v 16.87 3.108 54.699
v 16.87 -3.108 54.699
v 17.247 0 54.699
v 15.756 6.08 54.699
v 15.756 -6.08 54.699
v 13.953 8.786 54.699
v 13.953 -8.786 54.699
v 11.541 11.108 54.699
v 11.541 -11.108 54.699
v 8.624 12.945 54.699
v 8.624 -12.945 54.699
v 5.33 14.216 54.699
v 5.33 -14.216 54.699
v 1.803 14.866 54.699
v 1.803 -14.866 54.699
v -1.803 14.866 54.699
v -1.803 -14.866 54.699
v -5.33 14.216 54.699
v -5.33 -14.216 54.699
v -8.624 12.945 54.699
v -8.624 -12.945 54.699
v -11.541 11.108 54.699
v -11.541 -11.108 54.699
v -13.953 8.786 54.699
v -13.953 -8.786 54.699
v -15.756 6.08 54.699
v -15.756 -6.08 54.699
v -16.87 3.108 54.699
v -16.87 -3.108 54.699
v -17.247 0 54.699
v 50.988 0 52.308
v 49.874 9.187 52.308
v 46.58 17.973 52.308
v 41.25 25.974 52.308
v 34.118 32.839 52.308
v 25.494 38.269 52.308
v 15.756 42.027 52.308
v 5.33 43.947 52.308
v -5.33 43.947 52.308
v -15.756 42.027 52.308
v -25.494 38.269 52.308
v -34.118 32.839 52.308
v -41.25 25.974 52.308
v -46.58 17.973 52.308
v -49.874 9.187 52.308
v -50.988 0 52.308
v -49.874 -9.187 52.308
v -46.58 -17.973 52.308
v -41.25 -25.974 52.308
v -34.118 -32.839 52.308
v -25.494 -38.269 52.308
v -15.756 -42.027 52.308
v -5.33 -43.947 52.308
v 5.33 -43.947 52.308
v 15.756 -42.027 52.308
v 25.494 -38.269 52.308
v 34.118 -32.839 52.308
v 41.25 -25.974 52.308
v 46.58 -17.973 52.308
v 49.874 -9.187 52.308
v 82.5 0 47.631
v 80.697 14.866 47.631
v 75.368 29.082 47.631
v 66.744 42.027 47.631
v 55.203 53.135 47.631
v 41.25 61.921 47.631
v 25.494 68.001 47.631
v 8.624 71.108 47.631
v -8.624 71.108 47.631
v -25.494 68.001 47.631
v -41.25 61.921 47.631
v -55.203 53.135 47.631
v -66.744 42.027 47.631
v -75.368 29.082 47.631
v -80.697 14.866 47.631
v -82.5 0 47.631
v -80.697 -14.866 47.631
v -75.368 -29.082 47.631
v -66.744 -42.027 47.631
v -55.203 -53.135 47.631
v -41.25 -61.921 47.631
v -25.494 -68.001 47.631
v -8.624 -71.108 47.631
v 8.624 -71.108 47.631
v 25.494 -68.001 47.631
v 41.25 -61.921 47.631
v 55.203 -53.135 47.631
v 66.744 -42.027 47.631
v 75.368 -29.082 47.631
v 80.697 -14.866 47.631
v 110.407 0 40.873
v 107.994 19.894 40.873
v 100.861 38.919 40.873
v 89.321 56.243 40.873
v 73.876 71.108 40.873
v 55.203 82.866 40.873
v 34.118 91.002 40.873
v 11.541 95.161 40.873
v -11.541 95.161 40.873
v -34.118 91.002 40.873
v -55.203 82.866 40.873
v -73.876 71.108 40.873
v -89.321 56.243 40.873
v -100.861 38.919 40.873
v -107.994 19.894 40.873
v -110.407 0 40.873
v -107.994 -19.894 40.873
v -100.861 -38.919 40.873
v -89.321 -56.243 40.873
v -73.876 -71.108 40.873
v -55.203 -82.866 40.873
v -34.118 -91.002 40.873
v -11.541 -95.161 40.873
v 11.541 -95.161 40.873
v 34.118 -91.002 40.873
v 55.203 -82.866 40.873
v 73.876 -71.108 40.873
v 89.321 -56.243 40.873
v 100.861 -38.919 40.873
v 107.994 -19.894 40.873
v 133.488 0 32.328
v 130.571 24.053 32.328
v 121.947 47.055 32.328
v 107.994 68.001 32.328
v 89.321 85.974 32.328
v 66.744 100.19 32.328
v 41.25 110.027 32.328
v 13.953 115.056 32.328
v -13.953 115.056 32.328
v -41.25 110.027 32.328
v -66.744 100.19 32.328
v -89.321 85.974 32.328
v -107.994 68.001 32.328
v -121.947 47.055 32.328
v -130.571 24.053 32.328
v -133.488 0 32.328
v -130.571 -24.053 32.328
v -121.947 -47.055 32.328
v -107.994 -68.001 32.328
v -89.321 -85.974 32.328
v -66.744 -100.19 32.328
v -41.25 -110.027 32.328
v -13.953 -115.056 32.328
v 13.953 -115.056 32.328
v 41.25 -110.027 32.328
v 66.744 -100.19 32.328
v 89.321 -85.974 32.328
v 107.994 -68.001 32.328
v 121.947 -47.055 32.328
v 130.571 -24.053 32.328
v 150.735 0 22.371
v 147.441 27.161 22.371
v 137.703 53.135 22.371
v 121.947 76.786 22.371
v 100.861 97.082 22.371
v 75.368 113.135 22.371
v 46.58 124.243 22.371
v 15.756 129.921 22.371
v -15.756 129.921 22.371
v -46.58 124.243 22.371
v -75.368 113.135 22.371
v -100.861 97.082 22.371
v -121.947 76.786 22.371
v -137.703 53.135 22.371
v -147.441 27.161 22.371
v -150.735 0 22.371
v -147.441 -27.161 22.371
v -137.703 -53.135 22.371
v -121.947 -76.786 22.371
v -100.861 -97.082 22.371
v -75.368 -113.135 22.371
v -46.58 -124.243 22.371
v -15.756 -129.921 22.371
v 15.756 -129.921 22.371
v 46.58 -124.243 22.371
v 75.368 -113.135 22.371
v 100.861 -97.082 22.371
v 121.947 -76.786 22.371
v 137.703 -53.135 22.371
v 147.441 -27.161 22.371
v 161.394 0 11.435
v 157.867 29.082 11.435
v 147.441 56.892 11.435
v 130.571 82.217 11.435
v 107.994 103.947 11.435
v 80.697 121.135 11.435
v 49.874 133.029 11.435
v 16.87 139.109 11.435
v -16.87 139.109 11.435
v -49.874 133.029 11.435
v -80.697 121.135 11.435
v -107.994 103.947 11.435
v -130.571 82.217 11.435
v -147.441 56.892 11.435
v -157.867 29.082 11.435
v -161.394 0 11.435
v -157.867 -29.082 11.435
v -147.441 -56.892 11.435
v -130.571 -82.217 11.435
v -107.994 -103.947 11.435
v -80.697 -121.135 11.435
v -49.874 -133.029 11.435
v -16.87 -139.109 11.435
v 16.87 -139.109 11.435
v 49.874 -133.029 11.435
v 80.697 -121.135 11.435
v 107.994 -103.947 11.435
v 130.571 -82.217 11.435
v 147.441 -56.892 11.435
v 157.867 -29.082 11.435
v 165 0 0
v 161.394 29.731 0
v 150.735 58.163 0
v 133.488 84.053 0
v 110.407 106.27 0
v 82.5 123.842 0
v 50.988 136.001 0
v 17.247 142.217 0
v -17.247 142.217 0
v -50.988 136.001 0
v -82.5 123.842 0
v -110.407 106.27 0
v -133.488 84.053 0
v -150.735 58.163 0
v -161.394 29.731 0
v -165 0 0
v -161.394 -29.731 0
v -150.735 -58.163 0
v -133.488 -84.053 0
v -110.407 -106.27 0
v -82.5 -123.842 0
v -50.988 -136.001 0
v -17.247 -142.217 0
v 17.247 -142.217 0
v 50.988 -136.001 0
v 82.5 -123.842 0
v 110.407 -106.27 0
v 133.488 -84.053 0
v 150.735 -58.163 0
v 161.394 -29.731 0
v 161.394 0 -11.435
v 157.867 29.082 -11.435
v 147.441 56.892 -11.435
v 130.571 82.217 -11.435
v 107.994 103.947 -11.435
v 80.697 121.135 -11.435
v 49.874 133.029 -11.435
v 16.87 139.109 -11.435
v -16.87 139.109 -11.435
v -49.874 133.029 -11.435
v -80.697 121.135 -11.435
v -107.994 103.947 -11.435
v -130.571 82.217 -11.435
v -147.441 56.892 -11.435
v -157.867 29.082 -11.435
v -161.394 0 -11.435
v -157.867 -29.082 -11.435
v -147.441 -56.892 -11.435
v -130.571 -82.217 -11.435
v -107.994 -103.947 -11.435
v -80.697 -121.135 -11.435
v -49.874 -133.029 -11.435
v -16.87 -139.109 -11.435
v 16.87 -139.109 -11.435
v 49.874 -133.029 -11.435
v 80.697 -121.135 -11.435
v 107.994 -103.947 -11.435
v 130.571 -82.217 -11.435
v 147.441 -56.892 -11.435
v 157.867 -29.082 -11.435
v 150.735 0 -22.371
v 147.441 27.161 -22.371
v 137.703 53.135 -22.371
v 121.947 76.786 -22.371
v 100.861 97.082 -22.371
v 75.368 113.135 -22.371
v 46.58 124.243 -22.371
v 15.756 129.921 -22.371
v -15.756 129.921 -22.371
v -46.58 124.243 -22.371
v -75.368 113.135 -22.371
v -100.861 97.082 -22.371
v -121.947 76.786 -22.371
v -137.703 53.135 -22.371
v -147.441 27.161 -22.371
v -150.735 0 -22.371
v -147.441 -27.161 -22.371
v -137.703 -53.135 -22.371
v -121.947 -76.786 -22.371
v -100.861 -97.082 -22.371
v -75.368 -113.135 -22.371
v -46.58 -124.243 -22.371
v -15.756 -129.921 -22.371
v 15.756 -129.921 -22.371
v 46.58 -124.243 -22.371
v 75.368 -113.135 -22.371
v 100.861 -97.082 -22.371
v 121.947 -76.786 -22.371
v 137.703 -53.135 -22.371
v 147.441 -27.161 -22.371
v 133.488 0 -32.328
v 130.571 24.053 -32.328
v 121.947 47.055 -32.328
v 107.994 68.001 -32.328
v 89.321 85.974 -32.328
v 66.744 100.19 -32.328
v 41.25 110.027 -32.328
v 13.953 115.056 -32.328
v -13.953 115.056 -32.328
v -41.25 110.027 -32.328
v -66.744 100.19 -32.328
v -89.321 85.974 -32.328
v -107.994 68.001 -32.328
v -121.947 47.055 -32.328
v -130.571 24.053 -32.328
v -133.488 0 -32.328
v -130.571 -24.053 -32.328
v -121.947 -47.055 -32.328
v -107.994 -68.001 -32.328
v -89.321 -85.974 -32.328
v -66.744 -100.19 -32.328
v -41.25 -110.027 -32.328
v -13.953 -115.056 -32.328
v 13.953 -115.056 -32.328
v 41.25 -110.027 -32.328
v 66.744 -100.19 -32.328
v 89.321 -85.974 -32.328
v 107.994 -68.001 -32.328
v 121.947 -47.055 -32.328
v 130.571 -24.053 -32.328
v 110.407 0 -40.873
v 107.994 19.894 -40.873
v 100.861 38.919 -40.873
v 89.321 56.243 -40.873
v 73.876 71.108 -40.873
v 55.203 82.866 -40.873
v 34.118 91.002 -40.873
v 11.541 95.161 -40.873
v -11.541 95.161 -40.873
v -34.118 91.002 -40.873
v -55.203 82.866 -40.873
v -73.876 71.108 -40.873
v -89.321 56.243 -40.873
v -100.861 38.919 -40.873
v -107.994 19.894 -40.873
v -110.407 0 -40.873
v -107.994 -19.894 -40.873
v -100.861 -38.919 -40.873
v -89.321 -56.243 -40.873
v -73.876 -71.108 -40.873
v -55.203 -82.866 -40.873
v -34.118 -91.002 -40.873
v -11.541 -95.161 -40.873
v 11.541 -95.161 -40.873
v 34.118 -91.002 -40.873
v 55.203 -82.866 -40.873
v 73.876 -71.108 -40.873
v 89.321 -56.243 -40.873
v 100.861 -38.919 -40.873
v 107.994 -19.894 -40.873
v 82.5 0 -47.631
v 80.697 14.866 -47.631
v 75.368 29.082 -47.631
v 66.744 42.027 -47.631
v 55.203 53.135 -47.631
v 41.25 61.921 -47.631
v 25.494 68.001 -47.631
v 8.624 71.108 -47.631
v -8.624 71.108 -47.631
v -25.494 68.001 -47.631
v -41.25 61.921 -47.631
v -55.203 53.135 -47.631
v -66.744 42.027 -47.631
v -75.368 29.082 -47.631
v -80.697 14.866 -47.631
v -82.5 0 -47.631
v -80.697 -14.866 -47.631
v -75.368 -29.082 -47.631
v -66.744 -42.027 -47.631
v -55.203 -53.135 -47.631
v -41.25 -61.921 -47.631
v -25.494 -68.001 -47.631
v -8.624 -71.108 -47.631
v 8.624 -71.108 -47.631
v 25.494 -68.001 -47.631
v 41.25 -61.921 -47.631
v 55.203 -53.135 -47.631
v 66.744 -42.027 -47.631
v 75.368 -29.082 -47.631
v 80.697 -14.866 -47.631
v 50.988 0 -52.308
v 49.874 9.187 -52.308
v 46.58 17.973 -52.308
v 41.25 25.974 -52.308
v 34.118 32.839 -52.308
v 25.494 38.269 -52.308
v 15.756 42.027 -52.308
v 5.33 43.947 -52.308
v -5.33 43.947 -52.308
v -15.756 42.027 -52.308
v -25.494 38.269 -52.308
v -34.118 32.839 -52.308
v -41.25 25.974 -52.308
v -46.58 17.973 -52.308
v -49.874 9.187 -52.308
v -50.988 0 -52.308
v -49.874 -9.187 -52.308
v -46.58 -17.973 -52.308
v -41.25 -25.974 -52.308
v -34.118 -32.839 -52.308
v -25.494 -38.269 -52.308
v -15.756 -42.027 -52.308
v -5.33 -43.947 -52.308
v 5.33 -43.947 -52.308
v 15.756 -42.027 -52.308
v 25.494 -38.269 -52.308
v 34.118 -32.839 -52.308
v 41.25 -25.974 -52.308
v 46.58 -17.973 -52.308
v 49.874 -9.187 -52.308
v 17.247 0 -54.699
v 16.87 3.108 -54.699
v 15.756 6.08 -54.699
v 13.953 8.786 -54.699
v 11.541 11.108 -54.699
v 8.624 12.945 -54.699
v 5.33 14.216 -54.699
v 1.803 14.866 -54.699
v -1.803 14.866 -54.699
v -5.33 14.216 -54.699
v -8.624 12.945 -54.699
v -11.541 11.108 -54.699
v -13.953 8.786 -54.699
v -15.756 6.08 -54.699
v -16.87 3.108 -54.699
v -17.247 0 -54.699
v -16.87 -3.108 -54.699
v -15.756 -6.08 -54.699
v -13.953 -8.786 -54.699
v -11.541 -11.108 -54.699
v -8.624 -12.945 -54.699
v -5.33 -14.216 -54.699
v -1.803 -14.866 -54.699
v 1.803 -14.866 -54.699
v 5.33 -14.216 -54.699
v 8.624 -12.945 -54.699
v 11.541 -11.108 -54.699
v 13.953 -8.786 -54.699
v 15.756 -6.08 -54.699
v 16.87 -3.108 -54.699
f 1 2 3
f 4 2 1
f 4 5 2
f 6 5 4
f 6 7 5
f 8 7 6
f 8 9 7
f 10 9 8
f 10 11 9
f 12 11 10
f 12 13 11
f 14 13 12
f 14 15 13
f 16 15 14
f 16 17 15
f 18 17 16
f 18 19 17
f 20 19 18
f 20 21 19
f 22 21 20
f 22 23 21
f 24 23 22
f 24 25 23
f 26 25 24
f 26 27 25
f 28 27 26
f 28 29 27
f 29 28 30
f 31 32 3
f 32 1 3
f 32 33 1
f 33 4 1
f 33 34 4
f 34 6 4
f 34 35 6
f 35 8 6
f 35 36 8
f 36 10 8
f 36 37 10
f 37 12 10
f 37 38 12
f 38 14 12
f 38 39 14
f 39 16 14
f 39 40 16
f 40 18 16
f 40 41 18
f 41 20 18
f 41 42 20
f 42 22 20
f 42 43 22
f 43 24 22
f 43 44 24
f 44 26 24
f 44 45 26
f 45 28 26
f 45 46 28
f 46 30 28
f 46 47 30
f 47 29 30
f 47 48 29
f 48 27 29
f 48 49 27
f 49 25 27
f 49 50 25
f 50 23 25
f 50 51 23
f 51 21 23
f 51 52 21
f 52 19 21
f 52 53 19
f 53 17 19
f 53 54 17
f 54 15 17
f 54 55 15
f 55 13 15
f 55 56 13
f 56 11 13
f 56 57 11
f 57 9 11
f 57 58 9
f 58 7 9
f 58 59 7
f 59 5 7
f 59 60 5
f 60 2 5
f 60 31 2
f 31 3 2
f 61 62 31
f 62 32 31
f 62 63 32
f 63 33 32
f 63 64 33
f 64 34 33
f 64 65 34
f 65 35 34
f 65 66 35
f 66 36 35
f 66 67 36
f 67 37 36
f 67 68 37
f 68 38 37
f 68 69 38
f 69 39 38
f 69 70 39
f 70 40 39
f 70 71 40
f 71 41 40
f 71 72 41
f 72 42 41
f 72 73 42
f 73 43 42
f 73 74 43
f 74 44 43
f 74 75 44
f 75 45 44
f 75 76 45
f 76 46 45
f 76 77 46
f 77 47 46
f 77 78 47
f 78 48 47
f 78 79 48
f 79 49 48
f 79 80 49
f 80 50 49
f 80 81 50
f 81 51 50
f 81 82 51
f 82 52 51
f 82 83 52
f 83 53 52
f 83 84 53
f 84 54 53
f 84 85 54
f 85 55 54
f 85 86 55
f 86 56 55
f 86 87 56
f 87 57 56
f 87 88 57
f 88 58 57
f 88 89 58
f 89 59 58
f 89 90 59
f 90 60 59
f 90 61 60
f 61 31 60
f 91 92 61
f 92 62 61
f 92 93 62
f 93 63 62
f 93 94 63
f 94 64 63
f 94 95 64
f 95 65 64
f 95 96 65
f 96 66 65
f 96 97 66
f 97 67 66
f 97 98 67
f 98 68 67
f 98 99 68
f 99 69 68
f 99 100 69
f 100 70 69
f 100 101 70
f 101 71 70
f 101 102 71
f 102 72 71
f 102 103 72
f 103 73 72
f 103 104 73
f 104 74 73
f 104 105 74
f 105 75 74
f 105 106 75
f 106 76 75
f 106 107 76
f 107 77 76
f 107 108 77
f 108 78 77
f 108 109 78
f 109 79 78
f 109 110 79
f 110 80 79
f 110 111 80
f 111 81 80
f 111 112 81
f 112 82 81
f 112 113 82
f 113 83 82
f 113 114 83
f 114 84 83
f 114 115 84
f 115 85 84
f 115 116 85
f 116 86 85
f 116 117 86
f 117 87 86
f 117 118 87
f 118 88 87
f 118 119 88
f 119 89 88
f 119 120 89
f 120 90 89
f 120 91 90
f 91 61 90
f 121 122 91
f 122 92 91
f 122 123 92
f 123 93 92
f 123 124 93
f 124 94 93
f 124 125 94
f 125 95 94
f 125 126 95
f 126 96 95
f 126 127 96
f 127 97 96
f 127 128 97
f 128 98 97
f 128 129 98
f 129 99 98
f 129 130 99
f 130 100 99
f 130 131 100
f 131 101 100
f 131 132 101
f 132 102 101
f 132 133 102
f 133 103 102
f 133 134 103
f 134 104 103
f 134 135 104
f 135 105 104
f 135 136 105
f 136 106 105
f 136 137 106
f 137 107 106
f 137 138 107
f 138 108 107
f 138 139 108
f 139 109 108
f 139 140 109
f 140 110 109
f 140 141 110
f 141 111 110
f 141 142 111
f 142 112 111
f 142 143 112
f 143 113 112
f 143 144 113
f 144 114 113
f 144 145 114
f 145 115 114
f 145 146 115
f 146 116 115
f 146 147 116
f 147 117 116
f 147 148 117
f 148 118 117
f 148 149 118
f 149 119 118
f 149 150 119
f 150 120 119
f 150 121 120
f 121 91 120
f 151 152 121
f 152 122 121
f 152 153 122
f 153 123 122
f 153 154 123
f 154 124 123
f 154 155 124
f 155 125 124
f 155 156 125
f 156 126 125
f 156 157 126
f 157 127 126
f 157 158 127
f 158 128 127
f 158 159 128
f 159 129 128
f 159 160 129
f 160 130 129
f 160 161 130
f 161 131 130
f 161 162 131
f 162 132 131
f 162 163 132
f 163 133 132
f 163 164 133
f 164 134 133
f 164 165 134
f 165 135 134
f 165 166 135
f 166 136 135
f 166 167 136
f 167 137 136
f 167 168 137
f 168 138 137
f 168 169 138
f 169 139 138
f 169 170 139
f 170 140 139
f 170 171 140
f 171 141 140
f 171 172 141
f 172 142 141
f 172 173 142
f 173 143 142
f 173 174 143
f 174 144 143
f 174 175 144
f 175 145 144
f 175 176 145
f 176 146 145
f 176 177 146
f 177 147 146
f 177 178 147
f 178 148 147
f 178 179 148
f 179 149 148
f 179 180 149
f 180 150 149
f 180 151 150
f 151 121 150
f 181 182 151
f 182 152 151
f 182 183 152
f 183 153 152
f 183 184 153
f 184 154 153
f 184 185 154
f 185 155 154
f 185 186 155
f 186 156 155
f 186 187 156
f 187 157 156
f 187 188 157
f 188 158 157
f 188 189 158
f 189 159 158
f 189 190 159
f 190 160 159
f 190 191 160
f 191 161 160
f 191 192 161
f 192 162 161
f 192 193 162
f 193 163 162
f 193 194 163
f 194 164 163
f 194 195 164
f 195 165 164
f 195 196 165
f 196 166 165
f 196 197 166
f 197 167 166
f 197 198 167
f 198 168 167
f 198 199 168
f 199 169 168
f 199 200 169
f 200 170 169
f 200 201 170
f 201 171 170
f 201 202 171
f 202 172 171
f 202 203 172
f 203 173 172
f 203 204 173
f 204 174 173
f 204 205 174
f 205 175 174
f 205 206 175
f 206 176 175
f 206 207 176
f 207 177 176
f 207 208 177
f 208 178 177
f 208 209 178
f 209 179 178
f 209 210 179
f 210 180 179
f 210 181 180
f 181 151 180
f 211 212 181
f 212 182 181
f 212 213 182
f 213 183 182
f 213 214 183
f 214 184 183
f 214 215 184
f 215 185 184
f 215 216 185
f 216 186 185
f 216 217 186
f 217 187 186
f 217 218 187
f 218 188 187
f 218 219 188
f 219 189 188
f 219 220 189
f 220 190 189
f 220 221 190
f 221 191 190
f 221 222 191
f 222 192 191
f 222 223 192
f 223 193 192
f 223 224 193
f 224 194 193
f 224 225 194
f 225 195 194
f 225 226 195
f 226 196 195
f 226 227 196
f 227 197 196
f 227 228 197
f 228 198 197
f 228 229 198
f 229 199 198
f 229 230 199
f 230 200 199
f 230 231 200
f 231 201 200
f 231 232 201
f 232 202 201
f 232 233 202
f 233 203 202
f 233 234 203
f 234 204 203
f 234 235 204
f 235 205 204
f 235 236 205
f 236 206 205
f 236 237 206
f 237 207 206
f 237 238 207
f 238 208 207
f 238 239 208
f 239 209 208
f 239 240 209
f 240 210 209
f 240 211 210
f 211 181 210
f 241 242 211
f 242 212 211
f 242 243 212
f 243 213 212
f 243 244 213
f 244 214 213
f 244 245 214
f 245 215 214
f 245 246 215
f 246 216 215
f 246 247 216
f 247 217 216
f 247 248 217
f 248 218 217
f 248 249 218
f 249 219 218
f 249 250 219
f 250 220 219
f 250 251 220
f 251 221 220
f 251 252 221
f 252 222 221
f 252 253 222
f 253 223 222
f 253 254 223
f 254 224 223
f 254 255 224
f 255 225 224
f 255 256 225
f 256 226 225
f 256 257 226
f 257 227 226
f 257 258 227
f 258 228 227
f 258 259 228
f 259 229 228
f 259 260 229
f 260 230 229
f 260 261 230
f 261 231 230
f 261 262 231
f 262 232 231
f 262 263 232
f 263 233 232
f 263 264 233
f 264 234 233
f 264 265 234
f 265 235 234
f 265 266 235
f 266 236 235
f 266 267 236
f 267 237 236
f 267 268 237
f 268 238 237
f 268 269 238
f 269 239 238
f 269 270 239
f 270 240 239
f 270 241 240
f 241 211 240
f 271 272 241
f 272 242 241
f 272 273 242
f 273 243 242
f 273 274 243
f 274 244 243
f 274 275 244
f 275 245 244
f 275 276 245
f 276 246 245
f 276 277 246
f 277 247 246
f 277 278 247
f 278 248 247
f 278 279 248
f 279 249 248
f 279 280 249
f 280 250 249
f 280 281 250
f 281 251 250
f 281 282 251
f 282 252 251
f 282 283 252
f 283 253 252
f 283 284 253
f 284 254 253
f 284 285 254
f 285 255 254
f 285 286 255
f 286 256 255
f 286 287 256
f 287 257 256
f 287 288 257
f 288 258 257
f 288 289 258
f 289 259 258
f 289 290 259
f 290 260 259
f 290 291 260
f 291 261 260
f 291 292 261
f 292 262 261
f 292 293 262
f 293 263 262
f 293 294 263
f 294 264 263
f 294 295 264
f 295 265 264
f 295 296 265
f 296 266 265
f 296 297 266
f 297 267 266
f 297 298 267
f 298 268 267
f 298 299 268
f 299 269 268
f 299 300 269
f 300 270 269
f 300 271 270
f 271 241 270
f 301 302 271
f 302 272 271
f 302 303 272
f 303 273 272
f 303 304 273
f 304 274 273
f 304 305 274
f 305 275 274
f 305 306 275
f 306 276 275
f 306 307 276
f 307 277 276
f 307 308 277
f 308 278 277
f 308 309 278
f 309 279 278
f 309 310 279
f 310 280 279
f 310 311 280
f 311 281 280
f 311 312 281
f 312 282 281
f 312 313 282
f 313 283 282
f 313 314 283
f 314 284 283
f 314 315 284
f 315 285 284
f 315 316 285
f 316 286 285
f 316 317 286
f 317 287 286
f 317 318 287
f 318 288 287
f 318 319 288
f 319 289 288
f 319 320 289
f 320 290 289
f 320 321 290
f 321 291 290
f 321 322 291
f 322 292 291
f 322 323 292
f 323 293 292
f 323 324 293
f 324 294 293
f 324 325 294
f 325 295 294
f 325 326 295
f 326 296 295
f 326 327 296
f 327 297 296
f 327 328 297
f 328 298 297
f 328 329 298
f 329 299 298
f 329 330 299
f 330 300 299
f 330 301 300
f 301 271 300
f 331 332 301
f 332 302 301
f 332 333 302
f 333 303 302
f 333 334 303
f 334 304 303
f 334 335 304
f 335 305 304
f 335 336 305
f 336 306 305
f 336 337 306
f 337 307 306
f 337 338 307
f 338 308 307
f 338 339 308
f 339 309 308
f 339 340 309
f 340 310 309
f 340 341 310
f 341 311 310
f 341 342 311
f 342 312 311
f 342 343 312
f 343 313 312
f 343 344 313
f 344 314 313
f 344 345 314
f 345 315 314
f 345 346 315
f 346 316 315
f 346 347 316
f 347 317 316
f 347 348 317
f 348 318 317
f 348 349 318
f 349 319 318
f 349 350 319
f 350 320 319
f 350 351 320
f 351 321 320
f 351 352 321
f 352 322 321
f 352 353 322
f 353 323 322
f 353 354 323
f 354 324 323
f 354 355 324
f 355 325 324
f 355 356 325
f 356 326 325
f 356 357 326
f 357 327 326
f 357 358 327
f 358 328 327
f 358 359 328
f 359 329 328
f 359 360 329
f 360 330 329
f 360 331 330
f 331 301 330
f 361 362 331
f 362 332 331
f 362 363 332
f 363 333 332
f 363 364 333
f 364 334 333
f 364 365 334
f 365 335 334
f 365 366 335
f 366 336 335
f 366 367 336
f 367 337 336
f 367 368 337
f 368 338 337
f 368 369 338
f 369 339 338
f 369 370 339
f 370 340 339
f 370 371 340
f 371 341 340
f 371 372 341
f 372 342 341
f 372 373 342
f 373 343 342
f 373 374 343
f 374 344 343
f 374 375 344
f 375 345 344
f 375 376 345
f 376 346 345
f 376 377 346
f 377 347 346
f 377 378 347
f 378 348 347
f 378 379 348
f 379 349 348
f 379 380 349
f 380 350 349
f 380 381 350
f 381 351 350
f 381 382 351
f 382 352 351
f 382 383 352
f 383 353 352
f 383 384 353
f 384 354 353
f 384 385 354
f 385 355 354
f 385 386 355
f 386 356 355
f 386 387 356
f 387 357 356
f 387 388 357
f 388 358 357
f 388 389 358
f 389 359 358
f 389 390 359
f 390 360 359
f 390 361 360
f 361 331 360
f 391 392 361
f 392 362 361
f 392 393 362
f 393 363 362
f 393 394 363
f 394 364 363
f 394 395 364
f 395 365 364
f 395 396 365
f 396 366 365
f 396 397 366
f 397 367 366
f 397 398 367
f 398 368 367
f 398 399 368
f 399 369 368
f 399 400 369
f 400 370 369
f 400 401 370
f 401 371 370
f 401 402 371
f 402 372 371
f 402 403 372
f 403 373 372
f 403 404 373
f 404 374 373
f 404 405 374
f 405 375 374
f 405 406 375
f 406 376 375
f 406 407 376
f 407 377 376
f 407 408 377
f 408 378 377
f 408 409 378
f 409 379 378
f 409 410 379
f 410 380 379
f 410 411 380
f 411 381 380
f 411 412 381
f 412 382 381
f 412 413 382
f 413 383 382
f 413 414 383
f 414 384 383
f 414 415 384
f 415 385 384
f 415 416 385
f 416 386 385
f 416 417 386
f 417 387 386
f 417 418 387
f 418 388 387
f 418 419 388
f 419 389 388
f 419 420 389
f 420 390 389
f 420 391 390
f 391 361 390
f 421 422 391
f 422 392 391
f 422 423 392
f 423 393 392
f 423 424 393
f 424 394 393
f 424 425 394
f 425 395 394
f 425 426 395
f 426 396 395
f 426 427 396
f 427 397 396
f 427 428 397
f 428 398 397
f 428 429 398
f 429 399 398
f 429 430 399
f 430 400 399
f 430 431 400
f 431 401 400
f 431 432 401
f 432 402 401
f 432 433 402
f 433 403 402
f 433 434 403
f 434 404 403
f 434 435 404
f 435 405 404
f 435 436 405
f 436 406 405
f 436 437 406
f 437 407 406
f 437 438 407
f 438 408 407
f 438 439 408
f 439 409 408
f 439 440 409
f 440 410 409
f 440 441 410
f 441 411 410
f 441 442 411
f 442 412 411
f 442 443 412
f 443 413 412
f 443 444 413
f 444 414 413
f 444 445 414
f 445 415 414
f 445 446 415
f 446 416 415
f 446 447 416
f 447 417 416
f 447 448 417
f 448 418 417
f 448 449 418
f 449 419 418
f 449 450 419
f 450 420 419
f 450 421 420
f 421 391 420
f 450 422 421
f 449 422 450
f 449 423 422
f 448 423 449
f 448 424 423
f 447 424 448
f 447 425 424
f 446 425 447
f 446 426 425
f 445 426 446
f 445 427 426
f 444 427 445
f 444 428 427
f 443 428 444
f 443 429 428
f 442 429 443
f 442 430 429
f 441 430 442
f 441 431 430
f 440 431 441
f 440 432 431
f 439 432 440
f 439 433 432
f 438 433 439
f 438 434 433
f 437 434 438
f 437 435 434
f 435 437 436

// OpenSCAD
// Generated by SolidPython 1.0.1 on 2020-07-29 00:46:52


scale(v = [15, 13, 5]) {
	sphere(r = 11);
}
/***********************************************
*********      SolidPython code:      **********
************************************************
 
# import packages: SolidPython
from solid import *
from solid.utils import *
from itertools import chain, combinations, permutations


class Resize:

    def __init__(self, scad_file):
        self.scad_file = scad_file
        #self.scad_file = import_scad(scad_file)
        # cone/cylinder param:
        self.r1 = 0
        self.r2 = 0
        self.h = 0
        # rectangular prism param:
        self.w = 0
        self.l = 0
        # ellipse param:
        self.r = 0

    # import OpenScad code (file name corresponds to shape)


    # classify shape + parameters
    def assign(self, param1, param2, param3):
        if self.scad_file == 'cone.scad':
            self.r1 = param1
            self.r2 = param2
            self.h = param3
        elif self.scad_file == 'cylinder.scad':
            self.r1 = param1
            self.r2 = param2
            self.h = param3
        elif self.scad_file == 'rectangularPrism.scad':
            self.h = param1
            self.l = param2
            self.w = param3
        else:
            self.r = param1
            self.h = param2

    # resize parameters
    def iterate(self):
        x = range(3, 20, 2)
        i = 1
        if self.scad_file == 'cone.scad':
            tempList = list(permutations(x, 2))
            for temp in tempList:
                param1 = temp[0]
                param2 = temp[1]
                filepath = 'produced_scad_files/' + 'cone' + str(param1) + '_' + str(param2) + '_' + '.scad'
                scad_render_to_file(cylinder(h=param1, r1=param2, r2=0), filepath)

        elif self.scad_file == 'cylinder.scad':
            tempList = list(permutations(x, 3))
            for temp in tempList:
                param1 = temp[0]
                param2 = temp[1]
                filepath = 'produced_scad_files/' + 'cylinder' + str(param1) + '_' + str(param2) + '_' + '.scad'
                scad_render_to_file(cylinder(h=param1, r1=param2, r2=param2), filepath)

        elif self.scad_file == 'rectangularPrism.scad':
            tempList = list(permutations(x, 3))
            for temp in tempList:
                param1 = temp[0]
                param2 = temp[1]
                param3 = temp[2]
                filepath = 'produced_scad_files/' + 'rectangularPrism' + str(param1) + '_' + str(param2) + '_' + str(
                    param3) + '.scad'
                scad_render_to_file(cube(size=(param1, param2, param3)), filepath)

        elif self.scad_file == 'ellipse.scad':
            tempList = list(permutations(x, 4))
            for temp in tempList:
                param1 = temp[0]
                param2 = temp[1]
                param3 = temp[2]
                param4 = temp[3]
                filepath = 'produced_scad_files/' + 'ellipse' + str(param1) + '_' + str(param2) + '_' + str(param3) + '_' + str(param4) + '.scad'
                scad_render_to_file(scale([param1, param2, param3])(sphere(r=param4)), filepath)

    def render_to_scadfile(self):
        scad_render_to_file(scad, 'example.scad') 
 
************************************************/
